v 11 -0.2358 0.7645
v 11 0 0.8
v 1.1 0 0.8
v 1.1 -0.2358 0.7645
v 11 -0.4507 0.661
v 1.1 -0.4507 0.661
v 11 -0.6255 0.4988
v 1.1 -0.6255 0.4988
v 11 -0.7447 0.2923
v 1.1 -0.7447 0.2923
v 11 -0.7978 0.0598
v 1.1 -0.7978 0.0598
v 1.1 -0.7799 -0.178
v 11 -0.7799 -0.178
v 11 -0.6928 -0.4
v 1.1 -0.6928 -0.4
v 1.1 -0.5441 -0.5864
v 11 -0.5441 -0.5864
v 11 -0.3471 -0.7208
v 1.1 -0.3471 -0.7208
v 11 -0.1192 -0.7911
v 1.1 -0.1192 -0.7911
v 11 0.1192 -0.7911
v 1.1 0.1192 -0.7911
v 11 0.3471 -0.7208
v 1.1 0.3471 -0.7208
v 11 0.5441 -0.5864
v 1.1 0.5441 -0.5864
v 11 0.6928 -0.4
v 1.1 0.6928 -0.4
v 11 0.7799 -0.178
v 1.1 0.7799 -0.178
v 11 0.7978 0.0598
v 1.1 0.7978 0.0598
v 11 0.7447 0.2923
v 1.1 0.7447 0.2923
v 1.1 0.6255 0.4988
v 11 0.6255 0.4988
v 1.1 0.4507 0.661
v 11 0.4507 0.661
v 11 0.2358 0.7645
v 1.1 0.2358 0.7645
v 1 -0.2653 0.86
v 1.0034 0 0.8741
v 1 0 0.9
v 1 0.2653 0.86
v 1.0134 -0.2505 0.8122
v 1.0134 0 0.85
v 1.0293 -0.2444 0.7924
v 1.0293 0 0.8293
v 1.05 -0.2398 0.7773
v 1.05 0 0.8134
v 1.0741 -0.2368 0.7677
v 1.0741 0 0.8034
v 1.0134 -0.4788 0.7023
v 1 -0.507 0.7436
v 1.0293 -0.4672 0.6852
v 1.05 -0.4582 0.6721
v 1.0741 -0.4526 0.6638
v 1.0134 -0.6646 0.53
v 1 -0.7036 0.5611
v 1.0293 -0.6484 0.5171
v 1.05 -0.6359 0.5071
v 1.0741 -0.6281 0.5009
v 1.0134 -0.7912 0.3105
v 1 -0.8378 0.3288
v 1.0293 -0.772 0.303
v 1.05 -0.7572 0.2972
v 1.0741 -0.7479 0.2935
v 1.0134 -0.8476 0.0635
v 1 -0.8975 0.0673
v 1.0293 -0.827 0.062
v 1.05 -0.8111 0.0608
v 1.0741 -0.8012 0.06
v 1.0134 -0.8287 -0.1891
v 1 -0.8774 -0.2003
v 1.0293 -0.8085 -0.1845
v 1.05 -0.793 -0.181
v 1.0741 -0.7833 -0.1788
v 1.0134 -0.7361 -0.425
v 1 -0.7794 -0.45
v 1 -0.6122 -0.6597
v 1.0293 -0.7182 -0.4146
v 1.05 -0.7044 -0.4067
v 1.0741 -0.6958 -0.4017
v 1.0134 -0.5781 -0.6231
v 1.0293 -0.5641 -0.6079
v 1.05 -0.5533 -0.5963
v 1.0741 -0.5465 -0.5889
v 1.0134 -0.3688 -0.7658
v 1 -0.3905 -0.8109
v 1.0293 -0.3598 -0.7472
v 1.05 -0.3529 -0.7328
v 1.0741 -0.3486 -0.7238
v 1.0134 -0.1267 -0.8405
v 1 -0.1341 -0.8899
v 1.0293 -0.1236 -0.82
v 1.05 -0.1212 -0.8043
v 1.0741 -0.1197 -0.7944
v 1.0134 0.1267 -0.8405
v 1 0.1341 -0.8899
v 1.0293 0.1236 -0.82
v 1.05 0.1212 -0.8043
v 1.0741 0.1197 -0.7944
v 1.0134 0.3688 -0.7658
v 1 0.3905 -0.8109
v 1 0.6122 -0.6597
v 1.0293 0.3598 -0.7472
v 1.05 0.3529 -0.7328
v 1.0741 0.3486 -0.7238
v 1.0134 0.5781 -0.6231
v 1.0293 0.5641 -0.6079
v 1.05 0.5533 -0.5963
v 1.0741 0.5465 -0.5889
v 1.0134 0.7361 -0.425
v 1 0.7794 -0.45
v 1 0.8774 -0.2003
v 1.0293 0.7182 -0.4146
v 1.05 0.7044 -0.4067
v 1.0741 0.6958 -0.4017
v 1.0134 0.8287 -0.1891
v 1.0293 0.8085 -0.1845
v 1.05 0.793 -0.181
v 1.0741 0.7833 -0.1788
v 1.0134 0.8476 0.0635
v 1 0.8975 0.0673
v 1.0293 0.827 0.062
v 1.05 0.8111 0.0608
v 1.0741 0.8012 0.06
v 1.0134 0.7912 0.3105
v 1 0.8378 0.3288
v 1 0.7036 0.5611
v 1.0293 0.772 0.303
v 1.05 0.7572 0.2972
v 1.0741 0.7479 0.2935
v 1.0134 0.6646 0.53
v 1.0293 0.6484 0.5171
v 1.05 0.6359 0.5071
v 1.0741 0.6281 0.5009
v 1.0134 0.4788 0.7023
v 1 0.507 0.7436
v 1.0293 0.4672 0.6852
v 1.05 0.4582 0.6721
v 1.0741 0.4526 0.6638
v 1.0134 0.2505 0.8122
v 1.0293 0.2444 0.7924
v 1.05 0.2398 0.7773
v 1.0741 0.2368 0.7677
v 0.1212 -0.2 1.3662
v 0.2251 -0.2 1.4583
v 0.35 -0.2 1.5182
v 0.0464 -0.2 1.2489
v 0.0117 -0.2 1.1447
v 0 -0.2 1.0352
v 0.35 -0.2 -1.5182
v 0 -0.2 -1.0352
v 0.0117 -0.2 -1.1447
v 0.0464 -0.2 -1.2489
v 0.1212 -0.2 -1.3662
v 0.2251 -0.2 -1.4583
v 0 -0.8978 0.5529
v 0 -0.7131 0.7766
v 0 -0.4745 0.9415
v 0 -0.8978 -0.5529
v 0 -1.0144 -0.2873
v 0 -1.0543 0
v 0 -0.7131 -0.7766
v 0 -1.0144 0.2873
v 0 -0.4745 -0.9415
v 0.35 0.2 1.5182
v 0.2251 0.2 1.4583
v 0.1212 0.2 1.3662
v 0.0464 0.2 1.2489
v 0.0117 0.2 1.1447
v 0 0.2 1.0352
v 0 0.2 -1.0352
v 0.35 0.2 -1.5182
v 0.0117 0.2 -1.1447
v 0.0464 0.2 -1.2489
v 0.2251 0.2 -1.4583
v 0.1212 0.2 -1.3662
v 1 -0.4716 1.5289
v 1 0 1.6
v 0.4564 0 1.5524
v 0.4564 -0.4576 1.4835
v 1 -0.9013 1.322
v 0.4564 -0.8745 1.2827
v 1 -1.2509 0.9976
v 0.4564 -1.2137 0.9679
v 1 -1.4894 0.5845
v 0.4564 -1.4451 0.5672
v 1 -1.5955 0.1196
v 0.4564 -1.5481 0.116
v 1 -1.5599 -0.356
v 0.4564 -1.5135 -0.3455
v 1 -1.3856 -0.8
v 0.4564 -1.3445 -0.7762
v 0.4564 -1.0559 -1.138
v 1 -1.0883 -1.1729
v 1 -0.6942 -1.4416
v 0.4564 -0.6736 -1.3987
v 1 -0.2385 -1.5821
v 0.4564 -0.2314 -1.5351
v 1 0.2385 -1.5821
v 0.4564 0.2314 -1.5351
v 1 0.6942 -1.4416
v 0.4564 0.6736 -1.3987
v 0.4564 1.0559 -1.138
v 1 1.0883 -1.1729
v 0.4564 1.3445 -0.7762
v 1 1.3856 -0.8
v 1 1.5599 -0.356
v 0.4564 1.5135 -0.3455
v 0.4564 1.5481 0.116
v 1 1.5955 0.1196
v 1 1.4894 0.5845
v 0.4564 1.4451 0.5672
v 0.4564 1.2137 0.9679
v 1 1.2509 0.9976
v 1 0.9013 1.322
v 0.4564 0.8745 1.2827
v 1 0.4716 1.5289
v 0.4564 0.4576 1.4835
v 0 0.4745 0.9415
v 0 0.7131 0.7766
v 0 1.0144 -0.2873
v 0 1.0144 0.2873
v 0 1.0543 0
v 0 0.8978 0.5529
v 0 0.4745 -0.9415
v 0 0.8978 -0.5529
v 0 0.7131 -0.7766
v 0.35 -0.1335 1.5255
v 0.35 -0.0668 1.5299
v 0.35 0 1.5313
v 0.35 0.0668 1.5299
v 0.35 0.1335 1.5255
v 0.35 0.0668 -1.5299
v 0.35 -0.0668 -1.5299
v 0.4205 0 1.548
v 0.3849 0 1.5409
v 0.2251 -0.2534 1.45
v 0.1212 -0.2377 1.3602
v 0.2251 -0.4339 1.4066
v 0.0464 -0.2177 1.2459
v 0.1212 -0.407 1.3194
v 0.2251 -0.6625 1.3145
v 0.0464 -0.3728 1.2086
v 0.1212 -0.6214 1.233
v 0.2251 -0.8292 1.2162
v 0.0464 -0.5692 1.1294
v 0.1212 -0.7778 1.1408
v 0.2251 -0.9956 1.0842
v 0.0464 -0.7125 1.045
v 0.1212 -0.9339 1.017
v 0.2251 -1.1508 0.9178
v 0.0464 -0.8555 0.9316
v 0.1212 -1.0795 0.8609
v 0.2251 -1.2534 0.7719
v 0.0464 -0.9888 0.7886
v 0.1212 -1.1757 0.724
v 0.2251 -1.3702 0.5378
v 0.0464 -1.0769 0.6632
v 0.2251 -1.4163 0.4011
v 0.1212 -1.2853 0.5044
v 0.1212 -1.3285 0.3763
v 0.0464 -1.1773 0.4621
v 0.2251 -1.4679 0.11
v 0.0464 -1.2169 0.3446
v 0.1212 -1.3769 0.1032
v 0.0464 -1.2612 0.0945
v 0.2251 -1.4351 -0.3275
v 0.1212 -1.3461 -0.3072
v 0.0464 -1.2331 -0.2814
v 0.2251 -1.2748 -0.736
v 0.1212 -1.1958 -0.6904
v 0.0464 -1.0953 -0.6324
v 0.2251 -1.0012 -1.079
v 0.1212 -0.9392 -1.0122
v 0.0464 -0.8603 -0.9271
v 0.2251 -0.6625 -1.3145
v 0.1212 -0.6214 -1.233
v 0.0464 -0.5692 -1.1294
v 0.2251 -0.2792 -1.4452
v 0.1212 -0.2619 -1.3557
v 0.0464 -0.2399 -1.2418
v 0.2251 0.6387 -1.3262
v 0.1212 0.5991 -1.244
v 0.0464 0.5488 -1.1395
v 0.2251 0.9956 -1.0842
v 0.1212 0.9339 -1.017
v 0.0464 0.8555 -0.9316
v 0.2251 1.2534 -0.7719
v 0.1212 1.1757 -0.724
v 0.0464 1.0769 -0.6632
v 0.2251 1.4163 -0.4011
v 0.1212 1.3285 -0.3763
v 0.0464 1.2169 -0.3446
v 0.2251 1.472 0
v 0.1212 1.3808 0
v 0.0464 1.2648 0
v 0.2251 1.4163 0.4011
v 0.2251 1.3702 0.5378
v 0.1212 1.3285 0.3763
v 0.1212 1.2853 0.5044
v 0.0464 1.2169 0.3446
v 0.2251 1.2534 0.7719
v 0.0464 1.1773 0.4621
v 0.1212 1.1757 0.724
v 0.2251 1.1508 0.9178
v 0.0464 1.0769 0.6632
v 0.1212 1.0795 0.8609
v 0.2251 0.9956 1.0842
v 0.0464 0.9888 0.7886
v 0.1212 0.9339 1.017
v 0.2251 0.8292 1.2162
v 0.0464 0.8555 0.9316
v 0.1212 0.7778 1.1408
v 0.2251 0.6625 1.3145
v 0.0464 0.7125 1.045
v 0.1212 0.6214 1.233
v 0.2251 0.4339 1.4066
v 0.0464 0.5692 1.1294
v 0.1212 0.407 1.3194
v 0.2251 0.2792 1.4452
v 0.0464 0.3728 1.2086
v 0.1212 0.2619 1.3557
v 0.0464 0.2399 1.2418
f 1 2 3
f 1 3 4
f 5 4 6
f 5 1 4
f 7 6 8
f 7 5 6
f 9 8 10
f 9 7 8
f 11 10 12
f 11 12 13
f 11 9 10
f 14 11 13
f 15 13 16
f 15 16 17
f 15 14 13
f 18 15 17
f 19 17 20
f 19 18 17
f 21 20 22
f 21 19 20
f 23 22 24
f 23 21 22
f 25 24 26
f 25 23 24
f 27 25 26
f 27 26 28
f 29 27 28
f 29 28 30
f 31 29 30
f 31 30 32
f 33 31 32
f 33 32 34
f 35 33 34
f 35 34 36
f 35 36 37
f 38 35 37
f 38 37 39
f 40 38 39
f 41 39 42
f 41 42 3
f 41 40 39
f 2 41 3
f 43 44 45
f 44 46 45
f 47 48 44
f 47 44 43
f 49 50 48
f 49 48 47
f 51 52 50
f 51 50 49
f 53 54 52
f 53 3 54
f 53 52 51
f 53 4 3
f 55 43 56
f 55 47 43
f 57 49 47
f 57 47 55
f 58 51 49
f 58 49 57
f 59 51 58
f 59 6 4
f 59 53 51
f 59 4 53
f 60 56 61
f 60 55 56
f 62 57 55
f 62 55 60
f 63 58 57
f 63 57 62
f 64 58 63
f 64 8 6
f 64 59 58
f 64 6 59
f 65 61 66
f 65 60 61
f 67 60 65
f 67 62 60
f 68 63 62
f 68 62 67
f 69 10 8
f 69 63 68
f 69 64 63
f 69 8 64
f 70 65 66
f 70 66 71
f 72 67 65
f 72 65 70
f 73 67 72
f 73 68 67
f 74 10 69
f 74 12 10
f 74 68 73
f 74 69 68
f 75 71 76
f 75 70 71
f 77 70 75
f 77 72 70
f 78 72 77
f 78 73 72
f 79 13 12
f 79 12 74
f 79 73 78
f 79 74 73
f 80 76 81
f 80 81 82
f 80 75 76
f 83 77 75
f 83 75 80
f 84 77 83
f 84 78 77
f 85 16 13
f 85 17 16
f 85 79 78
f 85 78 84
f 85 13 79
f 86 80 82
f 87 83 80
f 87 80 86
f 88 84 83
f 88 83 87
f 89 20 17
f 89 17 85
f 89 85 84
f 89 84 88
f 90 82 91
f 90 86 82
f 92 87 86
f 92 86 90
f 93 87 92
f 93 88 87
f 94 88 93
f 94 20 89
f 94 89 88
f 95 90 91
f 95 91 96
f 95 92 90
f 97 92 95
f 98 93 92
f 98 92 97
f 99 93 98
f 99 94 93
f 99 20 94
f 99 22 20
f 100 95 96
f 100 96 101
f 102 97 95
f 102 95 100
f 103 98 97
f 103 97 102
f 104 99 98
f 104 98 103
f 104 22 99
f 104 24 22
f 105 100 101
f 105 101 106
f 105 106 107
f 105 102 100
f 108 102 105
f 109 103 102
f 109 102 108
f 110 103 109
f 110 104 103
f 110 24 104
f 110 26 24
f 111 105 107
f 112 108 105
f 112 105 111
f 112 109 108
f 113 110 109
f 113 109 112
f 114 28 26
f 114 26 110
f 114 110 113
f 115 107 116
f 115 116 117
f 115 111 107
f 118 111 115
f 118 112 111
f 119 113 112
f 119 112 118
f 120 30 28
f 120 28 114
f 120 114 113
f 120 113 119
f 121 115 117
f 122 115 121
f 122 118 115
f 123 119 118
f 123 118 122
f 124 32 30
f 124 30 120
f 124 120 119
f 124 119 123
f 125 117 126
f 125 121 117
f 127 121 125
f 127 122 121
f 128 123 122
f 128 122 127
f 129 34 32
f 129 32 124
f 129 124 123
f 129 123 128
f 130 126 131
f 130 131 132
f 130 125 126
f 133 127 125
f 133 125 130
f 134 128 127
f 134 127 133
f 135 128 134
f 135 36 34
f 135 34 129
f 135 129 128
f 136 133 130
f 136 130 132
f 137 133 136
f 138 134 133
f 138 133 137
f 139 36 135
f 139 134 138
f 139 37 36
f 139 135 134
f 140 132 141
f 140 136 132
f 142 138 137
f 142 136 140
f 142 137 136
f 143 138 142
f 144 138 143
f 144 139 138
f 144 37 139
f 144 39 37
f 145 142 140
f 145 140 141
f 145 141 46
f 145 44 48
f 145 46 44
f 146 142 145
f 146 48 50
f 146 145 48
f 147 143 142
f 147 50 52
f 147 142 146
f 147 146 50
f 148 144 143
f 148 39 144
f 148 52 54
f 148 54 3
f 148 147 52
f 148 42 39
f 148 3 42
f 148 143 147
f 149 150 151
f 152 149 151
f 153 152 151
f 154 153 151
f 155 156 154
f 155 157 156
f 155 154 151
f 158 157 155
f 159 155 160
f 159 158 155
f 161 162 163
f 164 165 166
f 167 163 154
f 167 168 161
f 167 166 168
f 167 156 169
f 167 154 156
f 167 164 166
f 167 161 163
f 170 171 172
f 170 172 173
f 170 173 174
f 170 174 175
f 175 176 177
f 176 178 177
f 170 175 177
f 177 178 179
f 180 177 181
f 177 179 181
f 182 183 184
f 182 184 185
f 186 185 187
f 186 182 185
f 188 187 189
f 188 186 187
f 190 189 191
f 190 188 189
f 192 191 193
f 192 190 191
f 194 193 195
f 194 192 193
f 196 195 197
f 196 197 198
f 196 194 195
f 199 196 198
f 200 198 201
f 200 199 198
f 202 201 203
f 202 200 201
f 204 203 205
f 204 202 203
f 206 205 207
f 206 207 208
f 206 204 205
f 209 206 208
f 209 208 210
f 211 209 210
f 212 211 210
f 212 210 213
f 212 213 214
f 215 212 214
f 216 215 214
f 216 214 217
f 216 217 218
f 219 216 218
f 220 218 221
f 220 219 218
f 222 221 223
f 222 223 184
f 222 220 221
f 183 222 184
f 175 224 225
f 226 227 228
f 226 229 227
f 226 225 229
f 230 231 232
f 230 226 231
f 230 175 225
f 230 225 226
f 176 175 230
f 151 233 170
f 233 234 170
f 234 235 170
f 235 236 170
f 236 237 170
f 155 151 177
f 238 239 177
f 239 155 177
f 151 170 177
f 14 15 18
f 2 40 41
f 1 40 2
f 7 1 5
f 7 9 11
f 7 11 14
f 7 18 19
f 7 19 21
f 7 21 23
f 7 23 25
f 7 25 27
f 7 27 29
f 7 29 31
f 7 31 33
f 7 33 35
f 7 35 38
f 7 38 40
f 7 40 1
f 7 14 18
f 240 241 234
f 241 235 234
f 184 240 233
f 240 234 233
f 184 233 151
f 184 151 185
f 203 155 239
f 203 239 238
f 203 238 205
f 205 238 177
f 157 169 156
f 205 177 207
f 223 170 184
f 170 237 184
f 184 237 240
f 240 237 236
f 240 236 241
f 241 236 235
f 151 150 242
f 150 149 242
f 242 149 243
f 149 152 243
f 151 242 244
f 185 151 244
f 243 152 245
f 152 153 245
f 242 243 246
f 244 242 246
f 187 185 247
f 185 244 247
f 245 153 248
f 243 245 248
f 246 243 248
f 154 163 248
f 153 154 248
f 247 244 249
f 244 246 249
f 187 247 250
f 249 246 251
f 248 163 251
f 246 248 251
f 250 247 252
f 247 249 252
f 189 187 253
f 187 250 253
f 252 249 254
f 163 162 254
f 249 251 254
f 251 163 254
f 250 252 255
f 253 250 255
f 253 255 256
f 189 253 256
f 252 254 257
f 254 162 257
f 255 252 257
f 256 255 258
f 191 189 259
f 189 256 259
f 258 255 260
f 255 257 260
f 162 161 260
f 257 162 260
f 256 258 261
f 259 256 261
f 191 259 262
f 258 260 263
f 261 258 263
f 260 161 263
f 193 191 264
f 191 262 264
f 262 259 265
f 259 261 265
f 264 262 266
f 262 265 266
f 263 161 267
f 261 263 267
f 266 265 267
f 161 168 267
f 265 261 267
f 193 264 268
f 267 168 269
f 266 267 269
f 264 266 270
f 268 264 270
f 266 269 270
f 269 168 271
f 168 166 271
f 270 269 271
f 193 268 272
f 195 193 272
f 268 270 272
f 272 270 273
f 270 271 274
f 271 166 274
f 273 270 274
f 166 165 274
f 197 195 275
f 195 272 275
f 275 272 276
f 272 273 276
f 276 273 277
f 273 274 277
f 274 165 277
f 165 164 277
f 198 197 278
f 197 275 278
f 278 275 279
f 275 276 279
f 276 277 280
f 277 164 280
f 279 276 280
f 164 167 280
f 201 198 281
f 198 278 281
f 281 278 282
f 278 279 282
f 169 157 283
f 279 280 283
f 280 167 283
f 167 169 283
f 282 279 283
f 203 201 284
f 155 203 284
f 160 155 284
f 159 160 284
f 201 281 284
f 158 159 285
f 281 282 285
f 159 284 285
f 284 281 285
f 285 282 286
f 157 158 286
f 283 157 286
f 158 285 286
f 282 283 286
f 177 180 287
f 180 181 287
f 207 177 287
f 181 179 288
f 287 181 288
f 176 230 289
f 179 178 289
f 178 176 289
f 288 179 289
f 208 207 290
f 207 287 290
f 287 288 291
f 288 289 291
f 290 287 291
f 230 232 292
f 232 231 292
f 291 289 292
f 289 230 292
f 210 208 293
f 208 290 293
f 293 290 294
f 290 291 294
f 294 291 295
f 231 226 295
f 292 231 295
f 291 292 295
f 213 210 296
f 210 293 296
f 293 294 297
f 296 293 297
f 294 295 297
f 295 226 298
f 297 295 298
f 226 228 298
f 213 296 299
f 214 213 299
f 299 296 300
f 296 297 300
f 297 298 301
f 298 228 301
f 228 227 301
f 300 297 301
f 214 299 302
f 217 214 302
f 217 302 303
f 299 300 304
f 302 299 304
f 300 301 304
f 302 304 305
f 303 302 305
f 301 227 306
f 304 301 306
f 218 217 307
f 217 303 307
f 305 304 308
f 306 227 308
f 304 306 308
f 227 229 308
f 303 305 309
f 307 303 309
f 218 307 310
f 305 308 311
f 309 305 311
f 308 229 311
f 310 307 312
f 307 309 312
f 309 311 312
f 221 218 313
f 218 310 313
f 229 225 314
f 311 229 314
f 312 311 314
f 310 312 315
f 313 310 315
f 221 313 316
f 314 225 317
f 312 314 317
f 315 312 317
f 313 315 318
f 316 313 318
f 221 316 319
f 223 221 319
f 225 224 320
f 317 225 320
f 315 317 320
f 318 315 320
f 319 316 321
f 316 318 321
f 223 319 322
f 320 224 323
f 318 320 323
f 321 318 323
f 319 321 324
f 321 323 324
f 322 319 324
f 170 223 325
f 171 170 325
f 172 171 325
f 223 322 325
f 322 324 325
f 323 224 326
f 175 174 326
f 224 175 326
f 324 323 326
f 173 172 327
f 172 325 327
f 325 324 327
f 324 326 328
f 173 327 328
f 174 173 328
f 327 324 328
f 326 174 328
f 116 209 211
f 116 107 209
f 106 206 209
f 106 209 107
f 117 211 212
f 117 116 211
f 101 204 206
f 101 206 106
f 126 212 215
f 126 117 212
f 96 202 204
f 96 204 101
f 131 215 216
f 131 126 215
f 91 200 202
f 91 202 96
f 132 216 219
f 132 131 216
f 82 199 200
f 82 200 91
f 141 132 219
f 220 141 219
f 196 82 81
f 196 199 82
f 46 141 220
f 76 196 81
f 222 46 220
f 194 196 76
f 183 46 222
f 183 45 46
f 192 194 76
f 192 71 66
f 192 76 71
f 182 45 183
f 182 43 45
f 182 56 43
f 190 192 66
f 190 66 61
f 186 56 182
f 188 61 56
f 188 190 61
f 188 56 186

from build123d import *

# Parameters (mm, degrees)
FILLET1_R     = 0.1
HEAD_RADIUS_R = 0.5
SLOTSKE_W     = 3.2
SLOTSKE_H     = 0.4
SLOT_DEPTH    = 0.35


with BuildPart() as part:
    # BodySke → BaseBody (revolve)
    with BuildSketch(Plane.XY, mode=Mode.PRIVATE) as basebody_sk:
        Polygon((0, 0), (0, 1.512511336), (1, 1.6), (1, 0.8), (11, 0.8), (11, 0), align=None)
    revolve(basebody_sk.sketch.rotate(Axis((0, 0, 0), (1, 0, 0)), 90), axis=Axis((0, 0, 0), (1, 0, 0)))

    # Fillet1
    fillet1_edges = [part.edges().sort_by_distance(p)[0] for p in [
        (1, 0, -0.8),
    ]]
    fillet(fillet1_edges, radius=FILLET1_R)

    # Head_Radius
    head_radius_edges = [part.edges().sort_by_distance(p)[0] for p in [
        (0, 0, -1.512511336),
    ]]
    fillet(head_radius_edges, radius=HEAD_RADIUS_R)

    # SlotSke → Slot (cut)
    with BuildSketch(Plane(origin=(0, 0, 0), x_dir=(0, 0, -1), z_dir=(1, 0, 0))):
        Rectangle(SLOTSKE_W, SLOTSKE_H)
    extrude(amount=SLOT_DEPTH, mode=Mode.SUBTRACT)


solid = part.part
